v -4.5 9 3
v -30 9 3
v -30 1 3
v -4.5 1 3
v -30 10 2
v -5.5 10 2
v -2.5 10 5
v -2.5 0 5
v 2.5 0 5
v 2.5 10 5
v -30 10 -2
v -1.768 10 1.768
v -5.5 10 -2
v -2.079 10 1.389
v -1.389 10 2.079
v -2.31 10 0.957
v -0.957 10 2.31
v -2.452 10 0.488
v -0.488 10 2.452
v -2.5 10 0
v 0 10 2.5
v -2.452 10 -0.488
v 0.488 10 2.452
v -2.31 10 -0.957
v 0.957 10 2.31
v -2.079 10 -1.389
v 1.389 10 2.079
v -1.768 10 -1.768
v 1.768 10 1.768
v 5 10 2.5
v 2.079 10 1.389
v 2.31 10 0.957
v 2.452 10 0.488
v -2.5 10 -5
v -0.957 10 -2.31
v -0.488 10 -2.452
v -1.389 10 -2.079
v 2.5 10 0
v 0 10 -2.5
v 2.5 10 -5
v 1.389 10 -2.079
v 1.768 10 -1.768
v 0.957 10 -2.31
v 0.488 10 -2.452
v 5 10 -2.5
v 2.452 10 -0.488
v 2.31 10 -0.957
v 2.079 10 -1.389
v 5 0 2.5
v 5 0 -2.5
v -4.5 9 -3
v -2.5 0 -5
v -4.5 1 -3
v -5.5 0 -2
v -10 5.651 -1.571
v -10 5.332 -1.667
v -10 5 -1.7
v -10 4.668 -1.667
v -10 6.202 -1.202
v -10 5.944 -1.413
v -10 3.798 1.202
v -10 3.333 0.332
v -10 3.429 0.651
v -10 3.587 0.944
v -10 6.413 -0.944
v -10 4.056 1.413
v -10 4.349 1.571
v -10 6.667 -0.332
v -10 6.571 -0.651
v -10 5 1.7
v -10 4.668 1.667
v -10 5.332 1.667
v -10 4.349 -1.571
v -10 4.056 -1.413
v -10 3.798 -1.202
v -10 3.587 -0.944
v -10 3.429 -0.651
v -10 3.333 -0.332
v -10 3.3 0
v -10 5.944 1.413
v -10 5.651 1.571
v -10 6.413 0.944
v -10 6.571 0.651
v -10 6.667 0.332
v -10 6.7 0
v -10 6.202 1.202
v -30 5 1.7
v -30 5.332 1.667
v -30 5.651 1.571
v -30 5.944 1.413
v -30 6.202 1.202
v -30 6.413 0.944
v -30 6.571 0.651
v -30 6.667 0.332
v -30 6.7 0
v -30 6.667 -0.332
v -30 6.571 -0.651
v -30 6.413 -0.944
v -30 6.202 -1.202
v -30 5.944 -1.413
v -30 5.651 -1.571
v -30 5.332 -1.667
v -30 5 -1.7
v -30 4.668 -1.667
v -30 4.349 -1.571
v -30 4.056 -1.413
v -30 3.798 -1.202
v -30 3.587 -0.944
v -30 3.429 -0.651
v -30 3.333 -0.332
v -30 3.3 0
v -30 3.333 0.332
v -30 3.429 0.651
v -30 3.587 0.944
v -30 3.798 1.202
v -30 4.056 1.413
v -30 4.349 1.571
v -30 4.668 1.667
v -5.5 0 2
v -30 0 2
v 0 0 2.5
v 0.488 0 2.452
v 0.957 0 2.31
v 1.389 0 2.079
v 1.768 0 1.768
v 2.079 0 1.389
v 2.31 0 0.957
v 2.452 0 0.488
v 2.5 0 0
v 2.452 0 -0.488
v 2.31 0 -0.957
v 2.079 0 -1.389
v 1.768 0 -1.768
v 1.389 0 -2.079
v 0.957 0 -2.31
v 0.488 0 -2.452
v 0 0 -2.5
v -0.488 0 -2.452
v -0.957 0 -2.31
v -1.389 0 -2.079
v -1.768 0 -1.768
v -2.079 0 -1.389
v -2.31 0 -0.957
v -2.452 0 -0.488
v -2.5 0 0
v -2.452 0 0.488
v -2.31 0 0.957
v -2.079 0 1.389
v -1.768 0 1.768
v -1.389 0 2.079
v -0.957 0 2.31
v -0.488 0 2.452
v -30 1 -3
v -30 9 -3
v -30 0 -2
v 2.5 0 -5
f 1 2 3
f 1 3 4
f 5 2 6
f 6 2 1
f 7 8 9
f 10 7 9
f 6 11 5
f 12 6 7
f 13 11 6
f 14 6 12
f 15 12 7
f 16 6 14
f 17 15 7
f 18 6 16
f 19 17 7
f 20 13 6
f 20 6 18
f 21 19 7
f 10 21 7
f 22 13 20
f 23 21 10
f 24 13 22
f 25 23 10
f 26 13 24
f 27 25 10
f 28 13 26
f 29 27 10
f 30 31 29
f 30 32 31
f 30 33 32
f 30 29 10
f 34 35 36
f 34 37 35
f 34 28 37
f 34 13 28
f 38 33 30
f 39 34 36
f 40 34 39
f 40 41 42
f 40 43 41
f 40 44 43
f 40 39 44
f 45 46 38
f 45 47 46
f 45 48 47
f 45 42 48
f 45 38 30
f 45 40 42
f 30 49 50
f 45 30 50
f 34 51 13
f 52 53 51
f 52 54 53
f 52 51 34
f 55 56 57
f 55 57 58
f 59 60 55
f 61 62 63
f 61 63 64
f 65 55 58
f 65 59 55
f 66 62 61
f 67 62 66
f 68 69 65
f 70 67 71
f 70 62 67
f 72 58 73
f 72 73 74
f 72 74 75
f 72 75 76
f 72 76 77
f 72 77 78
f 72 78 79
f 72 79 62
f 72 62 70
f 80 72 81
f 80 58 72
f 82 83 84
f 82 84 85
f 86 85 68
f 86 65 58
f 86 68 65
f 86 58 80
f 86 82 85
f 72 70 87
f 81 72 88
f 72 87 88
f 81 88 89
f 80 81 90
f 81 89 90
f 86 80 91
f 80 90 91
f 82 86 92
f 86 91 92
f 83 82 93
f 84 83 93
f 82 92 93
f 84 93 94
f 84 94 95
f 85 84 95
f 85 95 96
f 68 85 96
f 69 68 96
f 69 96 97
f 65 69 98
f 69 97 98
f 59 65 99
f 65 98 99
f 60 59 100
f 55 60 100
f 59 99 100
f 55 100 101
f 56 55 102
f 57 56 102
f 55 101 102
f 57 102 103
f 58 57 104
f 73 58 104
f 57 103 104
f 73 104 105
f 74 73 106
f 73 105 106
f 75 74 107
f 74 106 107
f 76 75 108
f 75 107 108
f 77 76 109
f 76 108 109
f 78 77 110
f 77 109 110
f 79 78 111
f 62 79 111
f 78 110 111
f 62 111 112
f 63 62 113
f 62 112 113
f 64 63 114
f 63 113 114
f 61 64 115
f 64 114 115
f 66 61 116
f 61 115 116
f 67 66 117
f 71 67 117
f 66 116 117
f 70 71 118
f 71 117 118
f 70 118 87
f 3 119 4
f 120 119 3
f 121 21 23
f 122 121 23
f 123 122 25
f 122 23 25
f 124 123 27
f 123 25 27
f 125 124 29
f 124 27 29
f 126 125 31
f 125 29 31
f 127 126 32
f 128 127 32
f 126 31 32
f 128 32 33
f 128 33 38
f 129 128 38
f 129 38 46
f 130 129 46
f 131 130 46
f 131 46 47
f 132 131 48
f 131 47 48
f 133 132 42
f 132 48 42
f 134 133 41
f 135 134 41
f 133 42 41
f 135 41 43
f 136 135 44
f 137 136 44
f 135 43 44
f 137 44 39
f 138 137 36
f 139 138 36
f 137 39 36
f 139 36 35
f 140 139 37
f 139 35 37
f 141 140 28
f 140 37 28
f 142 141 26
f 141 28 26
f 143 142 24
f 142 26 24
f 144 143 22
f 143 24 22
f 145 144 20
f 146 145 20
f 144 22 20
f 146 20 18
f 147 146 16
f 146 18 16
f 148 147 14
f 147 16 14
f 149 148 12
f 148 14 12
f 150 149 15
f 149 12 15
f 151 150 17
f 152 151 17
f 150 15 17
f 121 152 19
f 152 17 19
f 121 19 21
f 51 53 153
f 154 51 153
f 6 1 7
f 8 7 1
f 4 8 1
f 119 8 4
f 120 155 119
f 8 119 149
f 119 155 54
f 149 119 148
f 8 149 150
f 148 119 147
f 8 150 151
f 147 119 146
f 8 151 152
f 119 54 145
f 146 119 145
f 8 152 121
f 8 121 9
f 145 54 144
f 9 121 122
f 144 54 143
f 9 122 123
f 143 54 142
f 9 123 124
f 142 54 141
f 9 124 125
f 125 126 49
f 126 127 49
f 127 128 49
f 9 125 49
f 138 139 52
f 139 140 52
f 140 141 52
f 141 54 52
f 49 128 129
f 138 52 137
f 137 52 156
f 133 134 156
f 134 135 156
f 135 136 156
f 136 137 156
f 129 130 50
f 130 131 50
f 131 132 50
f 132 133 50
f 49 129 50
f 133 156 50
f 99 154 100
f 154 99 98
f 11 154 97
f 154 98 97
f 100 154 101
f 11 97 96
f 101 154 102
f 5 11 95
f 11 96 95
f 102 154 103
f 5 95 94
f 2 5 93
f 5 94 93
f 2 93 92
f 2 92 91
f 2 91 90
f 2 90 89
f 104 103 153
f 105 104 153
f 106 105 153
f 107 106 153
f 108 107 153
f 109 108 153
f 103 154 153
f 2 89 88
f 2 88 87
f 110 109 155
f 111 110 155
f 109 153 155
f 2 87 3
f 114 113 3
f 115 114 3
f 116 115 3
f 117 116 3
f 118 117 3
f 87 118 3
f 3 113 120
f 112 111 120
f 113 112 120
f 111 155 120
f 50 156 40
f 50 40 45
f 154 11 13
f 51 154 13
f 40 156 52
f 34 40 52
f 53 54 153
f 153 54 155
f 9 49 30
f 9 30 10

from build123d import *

# Parameters (mm, degrees)
BOSS_EXTRUDE1_DEPTH = 10
SKETCH2_R           = 2.5
CUT_EXTRUDE1_DEPTH  = 10
SKETCH4_R           = 1.7
CUT_EXTRUDE4_DEPTH  = 20
CHAMFER1_SIZE       = 2.5
CHAMFER2_SIZE       = 1


with BuildPart() as part:
    # Sketch1 → Boss-Extrude1 (new body)
    with BuildSketch(Plane(origin=(0, 0, 0), x_dir=(1, 0, 0), z_dir=(0, 1, 0))):
        Polygon((-5, 5), (-5, 3), (-30, 3), (-30, -3), (-5, -3), (-5, -5), (5, -5), (5, 5), align=None)
    extrude(amount=BOSS_EXTRUDE1_DEPTH)

    # Sketch2 → Cut-Extrude1 (cut)
    with BuildSketch(Plane(origin=(0, 10, 0), x_dir=(1, 0, 0), z_dir=(0, 1, 0))):
        with Locations(Location((0, 0, 0), (0, 0, 270))):
            Circle(SKETCH2_R)
    extrude(amount=-CUT_EXTRUDE1_DEPTH, mode=Mode.SUBTRACT)

    # Sketch4 → Cut-Extrude4 (cut)
    with BuildSketch(Plane.ZY.offset(30)):
        with Locations((0, 5)):
            Circle(SKETCH4_R)
    extrude(amount=-CUT_EXTRUDE4_DEPTH, mode=Mode.SUBTRACT)

    # Chamfer1
    # the kernel refuses this chamfer: 2.5 mm, written as the material it takes off along each edge
    with BuildSketch(Plane(origin=(5, -6.42920747, -5), x_dir=(-0.9996219169112968, 0, -0.027495876610586317), z_dir=(0, 1, 0)), Plane(origin=(5, -6.42920747, 5), x_dir=(0.027495876610586317, 0, -0.9996219169112968), z_dir=(0, 1, 0))) as chamfer1_piece_1:
        Polygon((CHAMFER1_SIZE * 0.999621916911, CHAMFER1_SIZE * 0.0274958766106), (-CHAMFER1_SIZE * 0.0274958766106, CHAMFER1_SIZE * 0.999621916911), (0, 0), align=None)
    extrude(amount=22.85841494, mode=Mode.SUBTRACT)
    with BuildSketch(Plane(origin=(-5, -6.42920747, 5), x_dir=(0.9996219169112968, 0, 0.027495876610586317), z_dir=(0, 1, 0))) as chamfer1_piece_2_section:
        Polygon((CHAMFER1_SIZE * 0.999621916911, CHAMFER1_SIZE * 0.0274958766106), (-CHAMFER1_SIZE * 0.0274958766106, CHAMFER1_SIZE * 0.999621916911), (0, 0), align=None)
    chamfer1_piece_2 = extrude(amount=22.85841494, mode=Mode.PRIVATE)
    chamfer1_piece_2 = split(chamfer1_piece_2, bisect_by=Plane(origin=(-4.135703969, 5, 3), z_dir=(0, 0, 1)), keep=Keep.TOP, mode=Mode.PRIVATE)
    add(chamfer1_piece_2, mode=Mode.SUBTRACT)
    with BuildSketch(Plane(origin=(-5, -6.42920747, -5), x_dir=(-0.027495876610588735, 0, 0.9996219169112968), z_dir=(0, 1, 0))) as chamfer1_piece_3_section:
        Polygon((CHAMFER1_SIZE * 0.999621916911, CHAMFER1_SIZE * 0.0274958766106), (-CHAMFER1_SIZE * 0.0274958766106, CHAMFER1_SIZE * 0.999621916911), (0, 0), align=None)
    chamfer1_piece_3 = extrude(amount=22.85841494, mode=Mode.PRIVATE)
    chamfer1_piece_3 = split(chamfer1_piece_3, bisect_by=Plane(origin=(-4.135703969, 5, -3), z_dir=(0, 0, -1)), keep=Keep.TOP, mode=Mode.PRIVATE)
    add(chamfer1_piece_3, mode=Mode.SUBTRACT)

    # Chamfer2
    chamfer2_edges = [part.edges().sort_by_distance(p)[0] for p in [
        (-17.25, 10, -3),
        (-17.25, 10, 3),
        (-17.25, 0, 3),
        (-17.25, 0, -3),
    ]]
    chamfer(chamfer2_edges, length=CHAMFER2_SIZE)


solid = part.part
